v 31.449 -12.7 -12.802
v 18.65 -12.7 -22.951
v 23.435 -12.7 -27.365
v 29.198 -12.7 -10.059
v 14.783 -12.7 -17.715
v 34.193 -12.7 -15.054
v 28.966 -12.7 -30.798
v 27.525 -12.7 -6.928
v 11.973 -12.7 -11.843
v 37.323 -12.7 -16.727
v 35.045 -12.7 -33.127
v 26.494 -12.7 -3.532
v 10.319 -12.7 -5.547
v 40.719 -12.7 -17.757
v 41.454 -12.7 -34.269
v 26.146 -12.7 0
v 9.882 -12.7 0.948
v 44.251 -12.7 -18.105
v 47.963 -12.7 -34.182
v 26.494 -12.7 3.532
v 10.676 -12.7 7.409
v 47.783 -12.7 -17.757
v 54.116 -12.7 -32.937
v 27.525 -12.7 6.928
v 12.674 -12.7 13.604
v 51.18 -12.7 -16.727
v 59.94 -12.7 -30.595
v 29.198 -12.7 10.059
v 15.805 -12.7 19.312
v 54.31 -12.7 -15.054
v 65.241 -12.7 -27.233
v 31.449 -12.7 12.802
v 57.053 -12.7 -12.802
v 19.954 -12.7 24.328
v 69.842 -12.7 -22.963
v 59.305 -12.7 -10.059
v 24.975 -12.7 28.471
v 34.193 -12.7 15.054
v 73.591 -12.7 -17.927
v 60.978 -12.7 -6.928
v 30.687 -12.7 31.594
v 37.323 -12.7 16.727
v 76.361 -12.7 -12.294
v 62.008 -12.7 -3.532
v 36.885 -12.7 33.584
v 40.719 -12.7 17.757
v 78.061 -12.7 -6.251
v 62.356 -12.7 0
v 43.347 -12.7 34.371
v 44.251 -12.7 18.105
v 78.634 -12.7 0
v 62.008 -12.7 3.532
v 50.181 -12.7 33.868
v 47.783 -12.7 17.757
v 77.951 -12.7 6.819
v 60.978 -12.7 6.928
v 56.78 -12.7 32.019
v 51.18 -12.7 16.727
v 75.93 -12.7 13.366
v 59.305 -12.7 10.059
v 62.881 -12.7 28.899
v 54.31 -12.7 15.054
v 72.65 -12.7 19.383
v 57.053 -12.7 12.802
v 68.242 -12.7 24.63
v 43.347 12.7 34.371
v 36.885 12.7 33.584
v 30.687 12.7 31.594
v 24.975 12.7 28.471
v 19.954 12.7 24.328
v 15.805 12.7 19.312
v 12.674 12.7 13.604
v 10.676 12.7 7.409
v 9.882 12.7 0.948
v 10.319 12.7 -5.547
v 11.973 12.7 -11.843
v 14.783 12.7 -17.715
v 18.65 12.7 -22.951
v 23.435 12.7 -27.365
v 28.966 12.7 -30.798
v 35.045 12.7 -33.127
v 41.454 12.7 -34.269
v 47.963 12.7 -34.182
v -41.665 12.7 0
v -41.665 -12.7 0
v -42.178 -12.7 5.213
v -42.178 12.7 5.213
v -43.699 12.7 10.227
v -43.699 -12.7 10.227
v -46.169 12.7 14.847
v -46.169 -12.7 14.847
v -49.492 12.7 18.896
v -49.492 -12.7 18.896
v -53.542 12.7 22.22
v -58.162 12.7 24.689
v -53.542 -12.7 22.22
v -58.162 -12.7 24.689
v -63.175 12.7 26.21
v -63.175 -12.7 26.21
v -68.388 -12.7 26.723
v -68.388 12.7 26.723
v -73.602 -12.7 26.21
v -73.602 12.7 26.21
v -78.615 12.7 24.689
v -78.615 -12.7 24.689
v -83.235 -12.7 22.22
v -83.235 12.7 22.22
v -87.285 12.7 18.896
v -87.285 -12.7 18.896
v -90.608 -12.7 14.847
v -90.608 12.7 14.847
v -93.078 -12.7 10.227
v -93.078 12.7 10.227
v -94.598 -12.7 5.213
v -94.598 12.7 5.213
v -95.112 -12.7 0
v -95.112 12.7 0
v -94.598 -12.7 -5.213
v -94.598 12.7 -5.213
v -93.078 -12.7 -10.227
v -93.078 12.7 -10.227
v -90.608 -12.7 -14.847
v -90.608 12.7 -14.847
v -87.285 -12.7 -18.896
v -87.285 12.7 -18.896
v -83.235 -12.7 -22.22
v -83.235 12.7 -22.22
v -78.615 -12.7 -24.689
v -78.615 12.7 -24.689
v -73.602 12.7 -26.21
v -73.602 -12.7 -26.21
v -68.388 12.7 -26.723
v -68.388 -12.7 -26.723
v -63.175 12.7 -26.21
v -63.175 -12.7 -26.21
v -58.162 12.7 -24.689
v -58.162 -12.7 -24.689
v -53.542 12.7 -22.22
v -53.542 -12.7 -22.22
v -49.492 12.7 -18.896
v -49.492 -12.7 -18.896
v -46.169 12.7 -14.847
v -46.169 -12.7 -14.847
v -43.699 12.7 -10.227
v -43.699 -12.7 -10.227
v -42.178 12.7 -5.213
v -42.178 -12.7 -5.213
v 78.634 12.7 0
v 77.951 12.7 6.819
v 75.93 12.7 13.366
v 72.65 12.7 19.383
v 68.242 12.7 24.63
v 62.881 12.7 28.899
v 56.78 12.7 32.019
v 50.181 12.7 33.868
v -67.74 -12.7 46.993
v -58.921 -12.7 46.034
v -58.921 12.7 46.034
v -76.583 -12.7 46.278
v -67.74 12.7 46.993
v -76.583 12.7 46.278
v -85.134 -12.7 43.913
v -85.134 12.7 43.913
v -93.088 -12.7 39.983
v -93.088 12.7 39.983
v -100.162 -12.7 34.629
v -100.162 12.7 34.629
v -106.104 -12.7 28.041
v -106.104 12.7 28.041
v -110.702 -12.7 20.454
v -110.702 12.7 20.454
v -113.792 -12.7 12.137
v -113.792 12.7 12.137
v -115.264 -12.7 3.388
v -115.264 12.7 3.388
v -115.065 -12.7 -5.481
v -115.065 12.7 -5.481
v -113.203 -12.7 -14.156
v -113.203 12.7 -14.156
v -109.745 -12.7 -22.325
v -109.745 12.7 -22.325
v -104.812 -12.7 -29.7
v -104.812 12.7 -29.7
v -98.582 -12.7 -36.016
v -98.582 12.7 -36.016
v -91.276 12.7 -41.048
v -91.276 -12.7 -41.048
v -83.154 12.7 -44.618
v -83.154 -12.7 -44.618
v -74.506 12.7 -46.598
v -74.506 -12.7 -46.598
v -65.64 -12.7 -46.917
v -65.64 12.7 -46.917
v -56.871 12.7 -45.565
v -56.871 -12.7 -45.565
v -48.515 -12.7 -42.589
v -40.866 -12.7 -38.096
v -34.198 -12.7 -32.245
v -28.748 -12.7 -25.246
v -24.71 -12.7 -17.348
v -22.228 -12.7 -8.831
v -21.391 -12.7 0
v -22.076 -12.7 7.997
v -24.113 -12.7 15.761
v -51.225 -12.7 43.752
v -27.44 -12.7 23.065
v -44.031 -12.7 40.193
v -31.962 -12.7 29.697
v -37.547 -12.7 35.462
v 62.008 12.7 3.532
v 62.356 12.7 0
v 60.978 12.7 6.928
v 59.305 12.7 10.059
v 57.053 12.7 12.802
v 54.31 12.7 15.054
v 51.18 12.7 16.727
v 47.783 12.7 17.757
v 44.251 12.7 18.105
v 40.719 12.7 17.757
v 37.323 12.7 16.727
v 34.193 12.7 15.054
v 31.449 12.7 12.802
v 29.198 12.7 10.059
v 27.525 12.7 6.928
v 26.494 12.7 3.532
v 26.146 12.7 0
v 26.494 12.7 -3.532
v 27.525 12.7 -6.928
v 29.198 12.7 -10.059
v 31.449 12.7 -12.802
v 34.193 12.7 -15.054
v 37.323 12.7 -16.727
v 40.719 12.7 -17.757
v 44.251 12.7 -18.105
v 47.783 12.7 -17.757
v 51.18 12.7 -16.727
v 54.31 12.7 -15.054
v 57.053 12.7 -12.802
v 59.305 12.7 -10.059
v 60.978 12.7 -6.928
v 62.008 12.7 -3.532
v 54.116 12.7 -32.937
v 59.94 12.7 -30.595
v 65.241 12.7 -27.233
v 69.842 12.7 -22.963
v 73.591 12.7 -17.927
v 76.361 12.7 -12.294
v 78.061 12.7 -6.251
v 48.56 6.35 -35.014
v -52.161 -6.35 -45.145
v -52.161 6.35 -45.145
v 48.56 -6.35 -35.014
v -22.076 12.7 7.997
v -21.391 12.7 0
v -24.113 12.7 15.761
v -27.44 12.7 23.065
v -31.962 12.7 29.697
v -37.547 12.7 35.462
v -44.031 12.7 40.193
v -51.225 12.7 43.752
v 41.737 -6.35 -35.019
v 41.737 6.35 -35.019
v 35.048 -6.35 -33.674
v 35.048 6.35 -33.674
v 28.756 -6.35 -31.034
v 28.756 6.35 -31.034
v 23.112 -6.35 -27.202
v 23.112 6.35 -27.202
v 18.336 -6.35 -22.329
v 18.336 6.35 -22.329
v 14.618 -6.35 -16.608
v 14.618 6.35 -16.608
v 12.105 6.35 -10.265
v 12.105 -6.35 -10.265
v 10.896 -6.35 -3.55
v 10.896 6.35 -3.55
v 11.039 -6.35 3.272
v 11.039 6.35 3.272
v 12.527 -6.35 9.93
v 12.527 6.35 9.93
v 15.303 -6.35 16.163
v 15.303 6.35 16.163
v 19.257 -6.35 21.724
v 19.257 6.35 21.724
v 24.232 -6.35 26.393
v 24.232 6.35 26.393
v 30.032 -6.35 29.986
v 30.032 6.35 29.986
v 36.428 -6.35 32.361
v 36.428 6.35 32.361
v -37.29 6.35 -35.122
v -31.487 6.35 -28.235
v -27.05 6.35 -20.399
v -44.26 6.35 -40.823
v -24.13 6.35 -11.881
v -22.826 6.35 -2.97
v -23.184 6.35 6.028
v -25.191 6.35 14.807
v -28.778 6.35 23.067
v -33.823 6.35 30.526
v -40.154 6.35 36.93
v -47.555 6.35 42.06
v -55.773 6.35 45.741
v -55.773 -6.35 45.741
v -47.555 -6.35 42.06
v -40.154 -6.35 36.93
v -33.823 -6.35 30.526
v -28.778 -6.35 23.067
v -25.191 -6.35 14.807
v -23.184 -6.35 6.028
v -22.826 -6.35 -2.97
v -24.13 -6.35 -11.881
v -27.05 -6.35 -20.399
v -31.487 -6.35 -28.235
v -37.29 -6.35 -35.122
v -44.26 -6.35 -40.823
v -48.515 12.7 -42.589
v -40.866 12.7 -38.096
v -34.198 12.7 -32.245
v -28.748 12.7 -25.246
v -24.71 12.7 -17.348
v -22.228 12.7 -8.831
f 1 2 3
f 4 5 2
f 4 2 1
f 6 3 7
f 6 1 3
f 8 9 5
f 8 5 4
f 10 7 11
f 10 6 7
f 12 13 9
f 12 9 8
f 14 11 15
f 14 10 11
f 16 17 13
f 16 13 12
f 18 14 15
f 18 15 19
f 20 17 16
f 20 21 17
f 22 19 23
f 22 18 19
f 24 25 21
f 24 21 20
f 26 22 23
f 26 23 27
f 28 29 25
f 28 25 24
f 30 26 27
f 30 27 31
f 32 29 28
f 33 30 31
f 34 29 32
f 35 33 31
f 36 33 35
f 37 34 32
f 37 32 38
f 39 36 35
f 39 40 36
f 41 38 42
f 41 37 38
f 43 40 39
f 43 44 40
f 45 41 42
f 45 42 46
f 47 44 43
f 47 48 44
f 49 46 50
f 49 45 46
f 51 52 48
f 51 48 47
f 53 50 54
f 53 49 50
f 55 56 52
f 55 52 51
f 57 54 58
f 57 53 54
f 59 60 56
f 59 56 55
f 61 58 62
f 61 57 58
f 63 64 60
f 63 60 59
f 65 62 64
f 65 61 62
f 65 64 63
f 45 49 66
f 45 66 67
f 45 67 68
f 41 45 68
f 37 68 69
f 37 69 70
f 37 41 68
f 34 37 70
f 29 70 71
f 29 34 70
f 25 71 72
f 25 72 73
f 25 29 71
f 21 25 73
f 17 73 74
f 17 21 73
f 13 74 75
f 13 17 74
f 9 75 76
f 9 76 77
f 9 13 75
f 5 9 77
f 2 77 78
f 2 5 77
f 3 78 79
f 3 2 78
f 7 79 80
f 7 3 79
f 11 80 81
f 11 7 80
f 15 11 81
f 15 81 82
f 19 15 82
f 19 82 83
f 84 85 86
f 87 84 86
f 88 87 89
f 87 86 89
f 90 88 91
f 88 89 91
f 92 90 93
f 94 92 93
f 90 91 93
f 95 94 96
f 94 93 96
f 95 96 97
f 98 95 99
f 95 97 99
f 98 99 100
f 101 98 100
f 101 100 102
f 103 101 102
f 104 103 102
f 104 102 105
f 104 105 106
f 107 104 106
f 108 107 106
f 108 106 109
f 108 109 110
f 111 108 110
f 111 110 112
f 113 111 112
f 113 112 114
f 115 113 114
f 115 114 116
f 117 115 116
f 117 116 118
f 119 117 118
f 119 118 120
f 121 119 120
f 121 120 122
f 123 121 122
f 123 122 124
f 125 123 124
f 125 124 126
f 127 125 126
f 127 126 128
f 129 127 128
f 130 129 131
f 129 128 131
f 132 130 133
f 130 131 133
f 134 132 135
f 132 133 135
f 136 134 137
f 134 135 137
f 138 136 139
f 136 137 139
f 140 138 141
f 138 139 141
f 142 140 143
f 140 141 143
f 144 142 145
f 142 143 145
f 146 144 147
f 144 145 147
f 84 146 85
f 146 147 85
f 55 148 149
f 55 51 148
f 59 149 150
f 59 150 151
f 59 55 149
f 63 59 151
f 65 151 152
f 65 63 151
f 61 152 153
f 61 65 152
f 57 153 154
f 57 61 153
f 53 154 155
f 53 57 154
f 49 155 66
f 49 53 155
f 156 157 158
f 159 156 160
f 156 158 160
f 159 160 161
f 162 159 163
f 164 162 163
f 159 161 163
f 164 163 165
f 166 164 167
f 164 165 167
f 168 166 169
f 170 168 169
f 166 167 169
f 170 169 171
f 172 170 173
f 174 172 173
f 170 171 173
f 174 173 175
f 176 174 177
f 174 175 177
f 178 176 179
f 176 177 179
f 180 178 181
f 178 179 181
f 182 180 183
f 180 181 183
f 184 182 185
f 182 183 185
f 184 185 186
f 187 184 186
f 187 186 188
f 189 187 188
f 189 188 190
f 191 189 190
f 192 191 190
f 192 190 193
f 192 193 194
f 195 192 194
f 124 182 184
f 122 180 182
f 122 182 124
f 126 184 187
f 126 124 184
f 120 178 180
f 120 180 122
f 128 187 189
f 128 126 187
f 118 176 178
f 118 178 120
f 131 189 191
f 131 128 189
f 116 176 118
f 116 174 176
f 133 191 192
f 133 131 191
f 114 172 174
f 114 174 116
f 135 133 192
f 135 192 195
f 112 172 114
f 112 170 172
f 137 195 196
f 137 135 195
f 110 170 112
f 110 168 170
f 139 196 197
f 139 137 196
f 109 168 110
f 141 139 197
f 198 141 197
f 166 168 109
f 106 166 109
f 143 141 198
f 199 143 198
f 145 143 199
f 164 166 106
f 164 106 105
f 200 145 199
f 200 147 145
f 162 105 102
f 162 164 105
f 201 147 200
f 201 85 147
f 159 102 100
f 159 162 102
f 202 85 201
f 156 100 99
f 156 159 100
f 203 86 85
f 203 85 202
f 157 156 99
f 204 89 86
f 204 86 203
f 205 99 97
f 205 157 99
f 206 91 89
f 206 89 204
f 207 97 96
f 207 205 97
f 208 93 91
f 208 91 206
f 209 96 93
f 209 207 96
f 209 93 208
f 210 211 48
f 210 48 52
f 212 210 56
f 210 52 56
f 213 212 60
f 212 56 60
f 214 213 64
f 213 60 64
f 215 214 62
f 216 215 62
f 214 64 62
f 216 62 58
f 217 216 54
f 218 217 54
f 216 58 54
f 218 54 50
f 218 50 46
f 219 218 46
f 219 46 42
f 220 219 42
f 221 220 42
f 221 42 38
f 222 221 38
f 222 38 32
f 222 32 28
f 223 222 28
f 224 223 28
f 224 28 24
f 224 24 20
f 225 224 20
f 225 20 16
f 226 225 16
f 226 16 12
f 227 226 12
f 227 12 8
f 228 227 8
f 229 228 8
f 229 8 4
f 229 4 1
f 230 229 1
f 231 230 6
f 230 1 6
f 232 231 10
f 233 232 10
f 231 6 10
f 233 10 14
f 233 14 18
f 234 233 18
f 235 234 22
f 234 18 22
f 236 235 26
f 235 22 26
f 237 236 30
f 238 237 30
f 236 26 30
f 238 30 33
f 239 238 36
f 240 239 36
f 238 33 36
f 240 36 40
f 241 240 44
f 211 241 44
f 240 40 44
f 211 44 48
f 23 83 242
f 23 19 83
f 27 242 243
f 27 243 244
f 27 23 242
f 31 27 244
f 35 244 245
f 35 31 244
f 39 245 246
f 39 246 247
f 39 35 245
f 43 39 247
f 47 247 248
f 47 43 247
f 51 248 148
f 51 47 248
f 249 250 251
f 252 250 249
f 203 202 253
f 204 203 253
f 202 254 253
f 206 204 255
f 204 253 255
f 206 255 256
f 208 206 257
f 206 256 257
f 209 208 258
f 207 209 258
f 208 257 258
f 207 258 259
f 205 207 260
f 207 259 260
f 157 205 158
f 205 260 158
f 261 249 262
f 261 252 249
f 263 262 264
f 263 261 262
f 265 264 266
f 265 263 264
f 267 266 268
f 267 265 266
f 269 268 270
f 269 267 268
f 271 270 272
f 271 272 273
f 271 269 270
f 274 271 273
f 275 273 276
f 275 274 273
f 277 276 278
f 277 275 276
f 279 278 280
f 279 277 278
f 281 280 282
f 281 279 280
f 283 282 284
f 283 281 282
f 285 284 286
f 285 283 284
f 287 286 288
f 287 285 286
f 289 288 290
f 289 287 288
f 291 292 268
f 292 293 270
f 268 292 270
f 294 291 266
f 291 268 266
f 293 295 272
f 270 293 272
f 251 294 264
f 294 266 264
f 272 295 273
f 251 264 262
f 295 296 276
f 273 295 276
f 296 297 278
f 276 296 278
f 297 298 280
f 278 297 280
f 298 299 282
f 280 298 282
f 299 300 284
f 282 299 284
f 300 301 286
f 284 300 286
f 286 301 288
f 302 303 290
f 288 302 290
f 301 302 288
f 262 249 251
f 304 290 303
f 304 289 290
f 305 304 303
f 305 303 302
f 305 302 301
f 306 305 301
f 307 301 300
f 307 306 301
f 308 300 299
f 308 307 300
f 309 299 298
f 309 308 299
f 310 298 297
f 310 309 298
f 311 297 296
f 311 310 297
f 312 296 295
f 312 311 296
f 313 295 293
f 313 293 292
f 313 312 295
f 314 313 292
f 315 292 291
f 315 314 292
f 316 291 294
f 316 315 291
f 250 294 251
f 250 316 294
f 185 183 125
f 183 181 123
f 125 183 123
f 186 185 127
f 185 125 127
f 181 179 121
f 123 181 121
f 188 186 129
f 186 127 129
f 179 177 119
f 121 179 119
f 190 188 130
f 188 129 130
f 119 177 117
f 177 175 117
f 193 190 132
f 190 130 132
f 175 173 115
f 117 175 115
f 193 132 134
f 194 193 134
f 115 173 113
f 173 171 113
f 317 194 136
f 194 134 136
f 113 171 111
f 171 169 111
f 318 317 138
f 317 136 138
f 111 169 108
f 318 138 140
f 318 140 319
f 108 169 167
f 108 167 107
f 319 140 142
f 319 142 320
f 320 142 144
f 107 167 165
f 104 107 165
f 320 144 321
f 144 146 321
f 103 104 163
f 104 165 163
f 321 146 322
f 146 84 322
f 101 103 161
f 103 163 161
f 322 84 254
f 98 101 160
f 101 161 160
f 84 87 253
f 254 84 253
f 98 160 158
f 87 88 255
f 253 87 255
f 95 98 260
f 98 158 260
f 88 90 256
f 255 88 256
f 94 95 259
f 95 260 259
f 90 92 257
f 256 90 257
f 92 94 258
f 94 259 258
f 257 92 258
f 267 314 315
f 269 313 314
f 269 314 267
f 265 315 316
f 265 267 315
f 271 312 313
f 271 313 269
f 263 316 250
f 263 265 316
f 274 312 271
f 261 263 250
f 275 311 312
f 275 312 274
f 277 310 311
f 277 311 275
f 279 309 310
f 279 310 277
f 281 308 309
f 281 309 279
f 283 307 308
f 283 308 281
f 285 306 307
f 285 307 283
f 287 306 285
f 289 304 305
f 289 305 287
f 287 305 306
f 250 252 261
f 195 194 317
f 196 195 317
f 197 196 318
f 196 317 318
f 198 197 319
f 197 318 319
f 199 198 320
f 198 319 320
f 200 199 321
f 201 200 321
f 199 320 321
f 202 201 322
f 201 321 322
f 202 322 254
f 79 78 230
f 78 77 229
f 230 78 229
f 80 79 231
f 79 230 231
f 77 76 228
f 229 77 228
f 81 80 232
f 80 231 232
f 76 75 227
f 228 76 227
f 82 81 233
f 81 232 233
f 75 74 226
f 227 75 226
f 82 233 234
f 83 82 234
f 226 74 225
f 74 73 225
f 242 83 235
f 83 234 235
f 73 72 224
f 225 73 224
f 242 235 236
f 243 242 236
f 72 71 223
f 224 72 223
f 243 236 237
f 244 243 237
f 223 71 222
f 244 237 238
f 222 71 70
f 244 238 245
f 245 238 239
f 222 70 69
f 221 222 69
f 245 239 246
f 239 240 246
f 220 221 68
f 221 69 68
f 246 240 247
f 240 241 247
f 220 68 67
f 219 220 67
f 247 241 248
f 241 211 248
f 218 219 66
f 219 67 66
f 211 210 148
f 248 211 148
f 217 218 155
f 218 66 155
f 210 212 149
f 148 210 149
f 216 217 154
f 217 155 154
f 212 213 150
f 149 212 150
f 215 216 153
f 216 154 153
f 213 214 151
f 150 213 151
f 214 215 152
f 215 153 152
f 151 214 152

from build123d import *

# Parameters (mm, degrees)
F1_DEPTH = 12.7
F3_DEPTH = 6.35
F4_R     = 26.723498
F5_DEPTH = 25.401
F6_R     = 18.104869
F7_DEPTH = 25.401


with BuildPart() as f1:
    # F0 (on Front) → F1 (new body, symmetric)
    with BuildSketch(Plane.XZ):
        with BuildLine():
            ThreePointArc((-56.871403, -45.564515), (-31.307178, -28.874687), (-21.390911, 0))
            ThreePointArc((-21.390911, 0), (-31.962277, 29.696838), (-58.920643, 46.033987))
            ThreePointArc((-58.920643, 46.033987), (-115.374196, -1.051165), (-56.871403, -45.564515))
        make_face()
        with BuildLine():
            ThreePointArc((78.634202, 0), (68.24179, 24.630053), (43.346882, 34.370963))
            ThreePointArc((43.346882, 34.370963), (9.946156, -2.309847), (47.962708, -34.181967))
            ThreePointArc((47.962708, -34.181967), (69.842243, -22.962727), (78.634202, 0))
        make_face()
    extrude(amount=F1_DEPTH, both=True)

    # F4 (on face) → F5 (cut, through all)
    with BuildSketch(Plane.XZ.offset(12.7)):
        with Locations((-68.388432, 0)):
            Circle(F4_R)
    extrude(amount=-F5_DEPTH, mode=Mode.SUBTRACT)

    # F6 (on face) → F7 (cut, through all)
    with BuildSketch(Plane.XZ.offset(12.7)):
        with Locations((44.251341, 0)):
            Circle(F6_R)
    extrude(amount=-F7_DEPTH, mode=Mode.SUBTRACT)


with BuildPart() as f3:
    # F2 (on Front) → F3 (new body, symmetric)
    with BuildSketch(Plane.XZ):
        with BuildLine():
            Line((36.427606, 32.361206), (-55.773471, 45.741286))
            ThreePointArc((-55.773471, 45.741286), (-22.797004, 1.537062), (-52.160535, -45.14531))
            Line((-52.160535, -45.14531), (48.559688, -35.013687))
            ThreePointArc((48.559688, -35.013687), (11.333443, -6.937205), (36.427606, 32.361206))
        make_face()
    extrude(amount=F3_DEPTH, both=True)


solid = Compound([f1.part, f3.part])
